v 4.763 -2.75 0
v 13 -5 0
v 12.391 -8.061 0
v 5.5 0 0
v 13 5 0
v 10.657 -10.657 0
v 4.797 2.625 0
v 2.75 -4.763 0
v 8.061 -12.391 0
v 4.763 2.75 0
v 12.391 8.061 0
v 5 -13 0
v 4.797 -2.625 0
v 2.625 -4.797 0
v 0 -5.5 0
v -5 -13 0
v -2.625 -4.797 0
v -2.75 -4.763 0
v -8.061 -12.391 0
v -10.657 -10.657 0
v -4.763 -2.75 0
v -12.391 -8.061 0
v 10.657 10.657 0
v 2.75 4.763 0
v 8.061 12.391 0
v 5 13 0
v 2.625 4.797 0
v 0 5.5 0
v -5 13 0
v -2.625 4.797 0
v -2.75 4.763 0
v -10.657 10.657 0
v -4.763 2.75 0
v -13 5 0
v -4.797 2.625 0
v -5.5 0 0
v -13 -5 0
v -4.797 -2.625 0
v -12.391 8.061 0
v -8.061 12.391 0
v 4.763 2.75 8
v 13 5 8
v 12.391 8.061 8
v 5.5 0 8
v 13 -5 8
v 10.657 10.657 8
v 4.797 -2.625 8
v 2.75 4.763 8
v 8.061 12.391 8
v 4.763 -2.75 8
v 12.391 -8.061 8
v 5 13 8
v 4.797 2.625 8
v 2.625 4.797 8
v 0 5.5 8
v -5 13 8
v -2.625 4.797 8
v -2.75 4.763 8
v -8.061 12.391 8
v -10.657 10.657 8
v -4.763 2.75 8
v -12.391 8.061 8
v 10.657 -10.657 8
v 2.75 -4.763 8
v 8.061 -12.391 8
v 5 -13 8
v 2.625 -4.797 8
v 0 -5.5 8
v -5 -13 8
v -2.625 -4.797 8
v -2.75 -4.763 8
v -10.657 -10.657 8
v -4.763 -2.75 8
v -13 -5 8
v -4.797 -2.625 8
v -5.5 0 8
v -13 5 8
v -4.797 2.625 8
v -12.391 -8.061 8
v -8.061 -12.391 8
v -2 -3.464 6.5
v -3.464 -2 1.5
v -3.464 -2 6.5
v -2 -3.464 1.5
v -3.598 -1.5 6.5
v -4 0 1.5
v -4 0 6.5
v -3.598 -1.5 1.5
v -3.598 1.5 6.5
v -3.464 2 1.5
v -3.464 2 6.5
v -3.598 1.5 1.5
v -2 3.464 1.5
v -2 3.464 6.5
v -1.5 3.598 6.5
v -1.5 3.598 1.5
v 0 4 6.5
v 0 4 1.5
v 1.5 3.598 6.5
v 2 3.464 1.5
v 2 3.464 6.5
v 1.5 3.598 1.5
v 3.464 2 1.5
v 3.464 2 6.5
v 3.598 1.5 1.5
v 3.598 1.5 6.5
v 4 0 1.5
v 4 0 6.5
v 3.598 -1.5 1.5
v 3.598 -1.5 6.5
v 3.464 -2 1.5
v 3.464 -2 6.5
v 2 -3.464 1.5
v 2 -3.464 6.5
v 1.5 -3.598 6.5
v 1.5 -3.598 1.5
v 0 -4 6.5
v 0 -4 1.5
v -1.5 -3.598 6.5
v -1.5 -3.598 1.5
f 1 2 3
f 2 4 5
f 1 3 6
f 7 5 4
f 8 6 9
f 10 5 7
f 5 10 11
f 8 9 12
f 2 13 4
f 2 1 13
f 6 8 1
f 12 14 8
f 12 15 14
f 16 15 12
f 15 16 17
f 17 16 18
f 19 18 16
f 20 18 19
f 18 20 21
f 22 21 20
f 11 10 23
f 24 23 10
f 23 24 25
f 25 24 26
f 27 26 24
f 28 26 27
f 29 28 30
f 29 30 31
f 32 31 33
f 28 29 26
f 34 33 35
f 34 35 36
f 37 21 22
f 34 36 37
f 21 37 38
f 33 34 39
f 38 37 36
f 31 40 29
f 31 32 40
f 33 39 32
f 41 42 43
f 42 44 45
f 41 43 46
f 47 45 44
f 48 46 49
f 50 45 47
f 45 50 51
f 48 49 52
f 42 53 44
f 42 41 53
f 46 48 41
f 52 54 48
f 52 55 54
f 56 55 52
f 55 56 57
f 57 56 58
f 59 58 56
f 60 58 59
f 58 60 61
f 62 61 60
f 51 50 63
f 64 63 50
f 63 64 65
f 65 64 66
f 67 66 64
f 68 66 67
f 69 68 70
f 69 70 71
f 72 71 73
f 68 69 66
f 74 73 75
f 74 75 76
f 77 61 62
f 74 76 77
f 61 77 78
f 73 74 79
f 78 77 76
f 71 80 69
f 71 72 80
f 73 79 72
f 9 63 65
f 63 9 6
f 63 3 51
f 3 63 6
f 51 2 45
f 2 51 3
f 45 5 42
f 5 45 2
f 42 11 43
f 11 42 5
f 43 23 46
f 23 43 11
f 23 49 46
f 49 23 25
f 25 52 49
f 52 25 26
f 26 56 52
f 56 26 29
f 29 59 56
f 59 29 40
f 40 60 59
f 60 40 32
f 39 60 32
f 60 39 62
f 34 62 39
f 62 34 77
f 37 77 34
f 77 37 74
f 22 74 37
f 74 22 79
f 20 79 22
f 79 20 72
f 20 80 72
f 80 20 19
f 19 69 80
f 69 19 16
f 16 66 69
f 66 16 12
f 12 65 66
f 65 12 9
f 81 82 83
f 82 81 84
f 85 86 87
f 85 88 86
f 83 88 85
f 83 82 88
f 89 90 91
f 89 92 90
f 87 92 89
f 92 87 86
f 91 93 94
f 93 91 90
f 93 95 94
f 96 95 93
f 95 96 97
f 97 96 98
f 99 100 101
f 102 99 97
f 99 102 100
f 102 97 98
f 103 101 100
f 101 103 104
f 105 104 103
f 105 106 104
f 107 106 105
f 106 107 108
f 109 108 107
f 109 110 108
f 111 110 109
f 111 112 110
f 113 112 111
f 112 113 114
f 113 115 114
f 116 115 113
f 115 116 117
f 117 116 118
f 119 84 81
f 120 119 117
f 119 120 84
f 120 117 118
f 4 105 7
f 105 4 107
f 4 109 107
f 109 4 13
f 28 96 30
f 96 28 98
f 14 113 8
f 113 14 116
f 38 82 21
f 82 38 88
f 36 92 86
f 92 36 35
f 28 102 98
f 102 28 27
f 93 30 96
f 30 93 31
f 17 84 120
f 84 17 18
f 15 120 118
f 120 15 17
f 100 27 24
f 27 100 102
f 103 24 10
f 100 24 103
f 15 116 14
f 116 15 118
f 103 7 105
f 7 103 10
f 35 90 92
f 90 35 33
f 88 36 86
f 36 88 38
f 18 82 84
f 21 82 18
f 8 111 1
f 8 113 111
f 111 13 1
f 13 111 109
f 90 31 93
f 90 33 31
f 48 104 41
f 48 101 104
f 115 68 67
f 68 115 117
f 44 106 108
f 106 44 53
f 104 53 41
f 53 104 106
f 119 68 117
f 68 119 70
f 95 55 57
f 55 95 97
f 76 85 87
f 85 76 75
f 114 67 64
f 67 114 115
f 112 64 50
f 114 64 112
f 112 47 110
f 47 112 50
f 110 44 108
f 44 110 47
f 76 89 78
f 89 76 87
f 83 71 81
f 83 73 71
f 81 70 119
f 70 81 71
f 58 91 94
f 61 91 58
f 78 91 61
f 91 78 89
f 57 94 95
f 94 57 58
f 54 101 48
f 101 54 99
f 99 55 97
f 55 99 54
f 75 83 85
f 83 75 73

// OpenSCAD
// file: wallace.scad
rod_size = 8;
rod_nut_size = 15; //12 for M6, 15 for M8
bearing_size = 15.5; //12.5 for LM6UU, 15.5 for LM8UU,LM8SUU
bearing_length = 24.5; //19.5 for LM6UU, 17.5 for LM8SUU, 24.5 for LM8UU
yz_motor_distance = 25;
motor_screw_spacing = 31; //26 for NEMA14, 31 for NEMA17
motor_casing = 45; //38 for NEMA14, 45 for NEMA17
end_height = 55; //measure the height of your motor casing and add 4mm. Suggestion: 40 for NEMA14, 55 for NEMA17
bed_mount_height = 16;
//x_rod_spacing = motor_screw_spacing + 3 + rod_size;
x_rod_spacing = 30;
x_carriage_width = 70;
carriage_extruder_offset = 5;
pulley_size = 20;
idler_pulley_width = 10;
gusset_size = 15;
m3_size = 3;
m3_nut_size = 6;
m4_size = 4;
motor_shaft_size = 5;
// ratio for converting diameter to apothem
da6 = 1 / cos(180 / 6) / 2;
da8 = 1 / cos(180 / 8) / 2;
// main file
include <wallace.scad>;
difference() {
	linear_extrude(height = rod_size, convexity = 5) difference() {
		minkowski() {
			square(rod_size + 2, center = true);
			circle(rod_size, $fn = 16);
		}
		circle(rod_size / 2, $fn = 12);
	}
	translate([0, 0, -rod_size / 16]) cylinder(r1 = rod_size * 3/4, r2 = rod_size / 4, h = rod_size / 2, $fn = 12);
	translate([0, 0, rod_size / 2 + rod_size / 16]) cylinder(r2 = rod_size * 3/4, r1 = rod_size / 4, h = rod_size / 2, $fn = 12);
}
